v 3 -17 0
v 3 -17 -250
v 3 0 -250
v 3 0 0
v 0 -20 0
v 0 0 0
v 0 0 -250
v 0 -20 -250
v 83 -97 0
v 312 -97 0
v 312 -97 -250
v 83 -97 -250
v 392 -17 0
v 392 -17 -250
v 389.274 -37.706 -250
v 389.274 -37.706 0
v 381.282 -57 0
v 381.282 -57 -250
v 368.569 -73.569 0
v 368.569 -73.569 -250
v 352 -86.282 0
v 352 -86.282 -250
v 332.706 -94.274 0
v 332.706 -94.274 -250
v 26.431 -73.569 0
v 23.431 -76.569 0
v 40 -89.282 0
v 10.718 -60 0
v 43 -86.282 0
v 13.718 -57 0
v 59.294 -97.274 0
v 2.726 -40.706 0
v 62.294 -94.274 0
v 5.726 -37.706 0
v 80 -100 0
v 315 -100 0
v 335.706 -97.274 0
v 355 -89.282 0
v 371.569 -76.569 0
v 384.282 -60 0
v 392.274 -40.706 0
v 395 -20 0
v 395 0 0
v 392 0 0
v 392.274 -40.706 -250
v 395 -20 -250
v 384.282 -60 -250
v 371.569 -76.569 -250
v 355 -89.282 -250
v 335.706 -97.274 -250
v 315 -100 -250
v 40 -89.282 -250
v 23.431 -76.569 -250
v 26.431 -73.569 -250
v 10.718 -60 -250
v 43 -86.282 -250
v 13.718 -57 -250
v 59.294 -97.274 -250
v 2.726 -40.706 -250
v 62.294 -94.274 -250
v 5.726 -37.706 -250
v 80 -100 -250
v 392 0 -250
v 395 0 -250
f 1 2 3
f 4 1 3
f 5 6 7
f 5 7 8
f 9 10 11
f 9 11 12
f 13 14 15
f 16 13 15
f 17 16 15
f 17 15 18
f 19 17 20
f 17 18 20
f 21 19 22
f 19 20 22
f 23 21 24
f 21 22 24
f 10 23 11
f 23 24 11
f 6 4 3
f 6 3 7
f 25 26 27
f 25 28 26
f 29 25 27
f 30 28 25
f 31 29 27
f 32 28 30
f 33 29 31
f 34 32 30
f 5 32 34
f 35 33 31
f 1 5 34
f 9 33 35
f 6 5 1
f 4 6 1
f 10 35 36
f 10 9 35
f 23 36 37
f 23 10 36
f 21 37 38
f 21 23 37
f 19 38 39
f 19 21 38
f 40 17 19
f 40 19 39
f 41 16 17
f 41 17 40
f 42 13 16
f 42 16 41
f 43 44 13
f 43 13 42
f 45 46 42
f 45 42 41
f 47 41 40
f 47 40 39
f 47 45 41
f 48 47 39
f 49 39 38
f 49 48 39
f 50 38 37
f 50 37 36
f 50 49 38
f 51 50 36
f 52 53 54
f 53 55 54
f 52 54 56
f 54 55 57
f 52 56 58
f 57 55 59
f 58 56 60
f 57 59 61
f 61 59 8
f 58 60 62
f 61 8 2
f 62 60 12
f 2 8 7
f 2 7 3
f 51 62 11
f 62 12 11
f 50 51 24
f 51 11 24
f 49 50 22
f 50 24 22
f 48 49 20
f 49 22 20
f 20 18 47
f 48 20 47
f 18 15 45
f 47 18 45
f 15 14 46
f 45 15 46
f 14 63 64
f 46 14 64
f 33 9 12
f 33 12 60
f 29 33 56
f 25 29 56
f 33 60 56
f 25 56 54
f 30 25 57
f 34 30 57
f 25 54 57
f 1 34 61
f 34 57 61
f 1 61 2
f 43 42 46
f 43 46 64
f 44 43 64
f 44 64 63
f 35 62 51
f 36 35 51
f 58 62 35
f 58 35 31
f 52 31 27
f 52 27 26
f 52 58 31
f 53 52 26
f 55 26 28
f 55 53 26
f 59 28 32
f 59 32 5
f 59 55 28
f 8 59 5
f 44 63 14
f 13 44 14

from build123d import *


with BuildPart() as part:
    # Sweep1: sweep along a path in Sketch1
    with BuildLine(Plane(origin=(0, 0, 0), x_dir=(1, 0, 0), z_dir=(0, 1, 0))) as sweep1_path:
        Line((197.5, 0), (197.5, 250))
    # Sketch4 → Sweep1 (sweep)
    with BuildSketch(Plane.XY):
        with BuildLine():
            Line((0, 0), (0, -20))
            ThreePointArc((0, -20), (23.431457505, -76.568542495), (80, -100))
            Line((80, -100), (315, -100))
            ThreePointArc((315, -100), (371.568542495, -76.568542495), (395, -20))
            Line((395, -20), (395, 0))
            Line((395, 0), (392, 0))
            Line((392, 0), (392, -17))
            ThreePointArc((392, -17), (368.568542495, -73.568542495), (312, -97))
            Line((312, -97), (83, -97))
            ThreePointArc((83, -97), (26.431457505, -73.568542495), (3, -17))
            Line((3, -17), (3, 0))
            Line((3, 0), (0, 0))
        make_face()
    sweep(path=sweep1_path.line)


solid = part.part
